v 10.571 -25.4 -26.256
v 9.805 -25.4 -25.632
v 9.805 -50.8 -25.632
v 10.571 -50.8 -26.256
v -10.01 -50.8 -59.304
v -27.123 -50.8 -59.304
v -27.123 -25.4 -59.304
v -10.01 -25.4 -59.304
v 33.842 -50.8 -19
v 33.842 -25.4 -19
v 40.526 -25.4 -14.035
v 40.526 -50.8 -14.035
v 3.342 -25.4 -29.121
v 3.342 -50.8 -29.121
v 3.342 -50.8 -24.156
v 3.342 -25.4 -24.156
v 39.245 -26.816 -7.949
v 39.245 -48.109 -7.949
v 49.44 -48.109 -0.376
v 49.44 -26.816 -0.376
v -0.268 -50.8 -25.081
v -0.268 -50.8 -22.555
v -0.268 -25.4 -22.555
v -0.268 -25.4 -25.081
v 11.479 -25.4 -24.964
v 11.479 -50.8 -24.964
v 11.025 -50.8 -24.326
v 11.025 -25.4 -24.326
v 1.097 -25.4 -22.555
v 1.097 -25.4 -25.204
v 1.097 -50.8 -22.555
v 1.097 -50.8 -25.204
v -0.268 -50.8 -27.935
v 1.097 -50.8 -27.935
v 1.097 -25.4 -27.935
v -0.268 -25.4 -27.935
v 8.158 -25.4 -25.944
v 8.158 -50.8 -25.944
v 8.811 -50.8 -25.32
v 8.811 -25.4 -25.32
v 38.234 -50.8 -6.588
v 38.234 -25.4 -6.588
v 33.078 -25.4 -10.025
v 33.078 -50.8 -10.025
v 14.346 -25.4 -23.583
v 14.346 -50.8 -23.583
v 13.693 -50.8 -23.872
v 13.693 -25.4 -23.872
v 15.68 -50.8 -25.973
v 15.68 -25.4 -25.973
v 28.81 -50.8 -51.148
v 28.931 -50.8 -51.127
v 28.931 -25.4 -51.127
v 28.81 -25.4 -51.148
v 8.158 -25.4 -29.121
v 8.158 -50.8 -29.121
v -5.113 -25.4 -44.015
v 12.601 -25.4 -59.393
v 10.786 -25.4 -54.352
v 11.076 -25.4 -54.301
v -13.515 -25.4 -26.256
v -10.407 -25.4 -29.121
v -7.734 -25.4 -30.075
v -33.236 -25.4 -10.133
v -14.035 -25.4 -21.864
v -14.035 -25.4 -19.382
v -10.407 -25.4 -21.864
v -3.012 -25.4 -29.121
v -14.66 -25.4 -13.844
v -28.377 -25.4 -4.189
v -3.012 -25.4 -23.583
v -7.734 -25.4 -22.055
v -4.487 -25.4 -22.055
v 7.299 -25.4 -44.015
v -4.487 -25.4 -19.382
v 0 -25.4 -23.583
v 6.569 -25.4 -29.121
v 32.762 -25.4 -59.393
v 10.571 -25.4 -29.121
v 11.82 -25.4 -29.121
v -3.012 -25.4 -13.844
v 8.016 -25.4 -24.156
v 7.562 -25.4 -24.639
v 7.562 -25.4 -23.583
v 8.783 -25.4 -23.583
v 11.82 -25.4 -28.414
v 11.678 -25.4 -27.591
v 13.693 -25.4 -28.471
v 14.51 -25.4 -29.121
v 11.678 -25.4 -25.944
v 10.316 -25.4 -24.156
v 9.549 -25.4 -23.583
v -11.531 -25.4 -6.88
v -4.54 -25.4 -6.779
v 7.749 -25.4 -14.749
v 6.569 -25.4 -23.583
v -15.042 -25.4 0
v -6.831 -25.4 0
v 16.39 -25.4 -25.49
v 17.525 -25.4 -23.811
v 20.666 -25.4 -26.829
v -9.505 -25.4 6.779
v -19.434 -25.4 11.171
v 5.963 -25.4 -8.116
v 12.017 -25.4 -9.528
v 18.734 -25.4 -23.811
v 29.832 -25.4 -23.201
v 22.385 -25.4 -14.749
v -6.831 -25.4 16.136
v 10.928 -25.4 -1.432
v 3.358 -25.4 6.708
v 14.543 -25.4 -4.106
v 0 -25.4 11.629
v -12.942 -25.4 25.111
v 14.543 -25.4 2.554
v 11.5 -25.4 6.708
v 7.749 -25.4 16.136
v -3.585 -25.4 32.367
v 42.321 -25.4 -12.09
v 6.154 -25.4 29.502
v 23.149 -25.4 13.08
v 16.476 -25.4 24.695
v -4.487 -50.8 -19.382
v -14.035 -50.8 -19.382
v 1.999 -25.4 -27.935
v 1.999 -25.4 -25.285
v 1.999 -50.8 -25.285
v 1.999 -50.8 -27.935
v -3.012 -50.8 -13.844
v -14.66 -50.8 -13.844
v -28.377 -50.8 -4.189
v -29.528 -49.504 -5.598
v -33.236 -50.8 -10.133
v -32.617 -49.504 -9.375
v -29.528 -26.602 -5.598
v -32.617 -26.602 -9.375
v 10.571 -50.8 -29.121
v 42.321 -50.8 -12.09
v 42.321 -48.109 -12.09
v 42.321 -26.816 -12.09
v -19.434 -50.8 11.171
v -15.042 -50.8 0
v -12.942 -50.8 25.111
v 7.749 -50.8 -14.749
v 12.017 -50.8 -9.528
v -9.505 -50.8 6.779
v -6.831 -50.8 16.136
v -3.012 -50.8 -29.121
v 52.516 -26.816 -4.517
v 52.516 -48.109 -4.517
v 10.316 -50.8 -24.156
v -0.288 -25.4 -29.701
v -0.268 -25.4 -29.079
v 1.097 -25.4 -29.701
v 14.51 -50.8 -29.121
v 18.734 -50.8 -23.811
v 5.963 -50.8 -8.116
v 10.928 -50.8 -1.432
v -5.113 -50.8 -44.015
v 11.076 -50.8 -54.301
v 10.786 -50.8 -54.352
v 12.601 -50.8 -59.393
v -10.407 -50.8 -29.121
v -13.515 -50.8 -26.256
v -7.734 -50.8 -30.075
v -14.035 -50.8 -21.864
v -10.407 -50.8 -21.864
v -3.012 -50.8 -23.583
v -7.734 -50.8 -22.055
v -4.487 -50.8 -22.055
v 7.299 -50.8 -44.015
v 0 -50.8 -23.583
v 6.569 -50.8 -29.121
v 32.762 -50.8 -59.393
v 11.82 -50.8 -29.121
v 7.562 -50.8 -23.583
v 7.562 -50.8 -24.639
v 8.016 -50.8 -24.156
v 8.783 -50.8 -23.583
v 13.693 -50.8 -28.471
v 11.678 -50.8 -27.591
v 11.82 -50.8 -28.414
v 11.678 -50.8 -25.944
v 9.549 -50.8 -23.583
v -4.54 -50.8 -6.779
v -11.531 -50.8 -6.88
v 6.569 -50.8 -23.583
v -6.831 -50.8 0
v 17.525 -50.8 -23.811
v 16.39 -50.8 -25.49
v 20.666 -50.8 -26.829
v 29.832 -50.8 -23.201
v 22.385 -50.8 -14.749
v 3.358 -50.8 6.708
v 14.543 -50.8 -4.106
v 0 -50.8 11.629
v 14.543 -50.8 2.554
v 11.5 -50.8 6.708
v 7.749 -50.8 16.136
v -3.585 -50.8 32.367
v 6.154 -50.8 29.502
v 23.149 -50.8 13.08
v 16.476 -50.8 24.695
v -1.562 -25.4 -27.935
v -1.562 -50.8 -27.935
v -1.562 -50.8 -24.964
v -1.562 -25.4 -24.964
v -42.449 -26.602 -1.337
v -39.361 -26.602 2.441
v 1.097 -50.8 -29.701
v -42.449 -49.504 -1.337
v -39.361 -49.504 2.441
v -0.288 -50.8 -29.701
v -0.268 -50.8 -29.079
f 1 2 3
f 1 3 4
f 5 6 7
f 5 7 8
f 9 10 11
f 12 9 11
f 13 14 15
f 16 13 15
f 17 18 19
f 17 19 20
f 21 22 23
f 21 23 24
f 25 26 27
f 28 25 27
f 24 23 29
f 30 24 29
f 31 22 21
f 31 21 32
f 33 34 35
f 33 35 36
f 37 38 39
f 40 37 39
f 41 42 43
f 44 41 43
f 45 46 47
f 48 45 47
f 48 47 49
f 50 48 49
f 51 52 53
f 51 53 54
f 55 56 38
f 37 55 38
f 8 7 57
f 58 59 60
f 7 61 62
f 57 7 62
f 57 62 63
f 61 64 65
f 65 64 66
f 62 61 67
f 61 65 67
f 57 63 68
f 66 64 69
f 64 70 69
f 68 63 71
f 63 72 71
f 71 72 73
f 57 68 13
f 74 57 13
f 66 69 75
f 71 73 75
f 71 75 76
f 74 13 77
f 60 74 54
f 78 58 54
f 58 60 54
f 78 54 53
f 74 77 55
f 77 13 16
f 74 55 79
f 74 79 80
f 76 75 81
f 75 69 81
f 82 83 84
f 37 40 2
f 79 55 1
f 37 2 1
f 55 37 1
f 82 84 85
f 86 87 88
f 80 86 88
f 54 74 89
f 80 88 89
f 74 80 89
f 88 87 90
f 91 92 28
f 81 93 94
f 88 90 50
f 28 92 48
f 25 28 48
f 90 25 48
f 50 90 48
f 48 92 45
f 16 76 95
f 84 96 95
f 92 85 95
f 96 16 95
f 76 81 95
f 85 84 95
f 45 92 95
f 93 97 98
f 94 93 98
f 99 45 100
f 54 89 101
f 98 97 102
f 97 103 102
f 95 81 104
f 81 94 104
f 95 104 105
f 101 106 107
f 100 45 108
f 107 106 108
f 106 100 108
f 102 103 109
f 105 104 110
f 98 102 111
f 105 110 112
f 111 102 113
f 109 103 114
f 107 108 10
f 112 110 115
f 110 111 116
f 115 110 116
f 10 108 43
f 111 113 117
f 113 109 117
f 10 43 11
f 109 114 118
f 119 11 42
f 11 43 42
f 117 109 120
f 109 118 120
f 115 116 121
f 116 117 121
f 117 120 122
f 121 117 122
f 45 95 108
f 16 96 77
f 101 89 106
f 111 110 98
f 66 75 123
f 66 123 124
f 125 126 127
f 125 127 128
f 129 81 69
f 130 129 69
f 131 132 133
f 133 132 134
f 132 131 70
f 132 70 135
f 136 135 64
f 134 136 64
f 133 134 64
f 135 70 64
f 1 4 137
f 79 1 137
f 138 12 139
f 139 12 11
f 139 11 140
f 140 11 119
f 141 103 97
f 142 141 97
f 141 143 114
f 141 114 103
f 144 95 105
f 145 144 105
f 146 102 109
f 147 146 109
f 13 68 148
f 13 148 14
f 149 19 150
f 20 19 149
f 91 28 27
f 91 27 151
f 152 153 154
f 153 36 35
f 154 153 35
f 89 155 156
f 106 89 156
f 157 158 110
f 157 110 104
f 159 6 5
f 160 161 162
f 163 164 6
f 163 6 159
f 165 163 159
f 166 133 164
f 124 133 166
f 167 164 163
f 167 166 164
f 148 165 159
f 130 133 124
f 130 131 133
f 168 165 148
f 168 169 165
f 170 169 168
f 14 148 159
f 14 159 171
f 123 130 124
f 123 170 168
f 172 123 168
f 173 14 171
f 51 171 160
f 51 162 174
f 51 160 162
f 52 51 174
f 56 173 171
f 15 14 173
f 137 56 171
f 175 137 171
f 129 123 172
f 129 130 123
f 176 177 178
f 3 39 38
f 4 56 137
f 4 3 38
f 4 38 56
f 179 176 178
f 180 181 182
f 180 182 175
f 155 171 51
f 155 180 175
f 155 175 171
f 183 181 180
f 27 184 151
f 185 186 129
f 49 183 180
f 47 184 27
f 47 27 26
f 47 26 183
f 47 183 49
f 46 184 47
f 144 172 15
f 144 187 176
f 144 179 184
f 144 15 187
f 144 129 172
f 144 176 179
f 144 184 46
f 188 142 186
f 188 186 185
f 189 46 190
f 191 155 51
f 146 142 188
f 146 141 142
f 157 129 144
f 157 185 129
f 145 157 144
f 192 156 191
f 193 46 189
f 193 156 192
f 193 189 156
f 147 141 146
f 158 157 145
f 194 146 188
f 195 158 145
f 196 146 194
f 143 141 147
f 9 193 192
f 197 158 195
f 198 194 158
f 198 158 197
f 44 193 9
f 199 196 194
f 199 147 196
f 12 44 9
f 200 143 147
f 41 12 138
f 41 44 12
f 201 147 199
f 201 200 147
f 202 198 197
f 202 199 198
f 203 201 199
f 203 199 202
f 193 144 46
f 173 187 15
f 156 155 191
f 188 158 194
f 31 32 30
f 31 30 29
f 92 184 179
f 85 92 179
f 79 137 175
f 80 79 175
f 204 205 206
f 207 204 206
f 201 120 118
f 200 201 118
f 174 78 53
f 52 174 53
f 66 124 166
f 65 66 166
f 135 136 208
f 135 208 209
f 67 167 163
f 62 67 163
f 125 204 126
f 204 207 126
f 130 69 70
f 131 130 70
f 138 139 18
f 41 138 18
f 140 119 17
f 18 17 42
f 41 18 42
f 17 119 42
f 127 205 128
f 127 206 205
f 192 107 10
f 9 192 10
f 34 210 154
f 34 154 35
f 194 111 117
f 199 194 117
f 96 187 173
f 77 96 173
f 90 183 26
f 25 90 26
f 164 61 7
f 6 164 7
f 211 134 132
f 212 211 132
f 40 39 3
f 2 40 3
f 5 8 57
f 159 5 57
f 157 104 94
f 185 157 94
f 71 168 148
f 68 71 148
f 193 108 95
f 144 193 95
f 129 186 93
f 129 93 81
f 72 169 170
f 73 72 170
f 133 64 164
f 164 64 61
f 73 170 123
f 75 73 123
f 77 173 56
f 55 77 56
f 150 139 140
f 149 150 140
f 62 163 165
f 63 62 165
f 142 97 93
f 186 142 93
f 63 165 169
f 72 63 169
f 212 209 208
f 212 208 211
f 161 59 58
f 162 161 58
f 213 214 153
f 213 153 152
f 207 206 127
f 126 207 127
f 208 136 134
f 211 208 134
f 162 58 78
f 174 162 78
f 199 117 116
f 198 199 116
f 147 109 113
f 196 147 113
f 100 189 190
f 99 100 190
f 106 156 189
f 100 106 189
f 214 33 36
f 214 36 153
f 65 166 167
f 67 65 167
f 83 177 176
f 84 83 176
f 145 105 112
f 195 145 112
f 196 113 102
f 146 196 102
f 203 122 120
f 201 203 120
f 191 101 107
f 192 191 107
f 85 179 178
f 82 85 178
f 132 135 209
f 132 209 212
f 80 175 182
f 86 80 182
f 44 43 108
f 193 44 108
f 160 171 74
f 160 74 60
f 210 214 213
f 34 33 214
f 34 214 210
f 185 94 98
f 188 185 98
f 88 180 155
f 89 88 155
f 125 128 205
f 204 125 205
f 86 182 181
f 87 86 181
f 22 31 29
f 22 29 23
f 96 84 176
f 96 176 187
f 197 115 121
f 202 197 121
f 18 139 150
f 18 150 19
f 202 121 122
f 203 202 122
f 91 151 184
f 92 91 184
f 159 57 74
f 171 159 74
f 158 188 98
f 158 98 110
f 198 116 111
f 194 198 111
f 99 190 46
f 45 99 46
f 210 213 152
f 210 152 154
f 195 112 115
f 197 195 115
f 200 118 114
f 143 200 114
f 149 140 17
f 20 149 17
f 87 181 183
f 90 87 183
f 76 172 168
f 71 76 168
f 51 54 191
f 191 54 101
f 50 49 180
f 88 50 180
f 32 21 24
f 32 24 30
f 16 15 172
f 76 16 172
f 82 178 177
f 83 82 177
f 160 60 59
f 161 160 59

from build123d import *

# Parameters (mm, degrees)
F0_W      = 127
F0_H      = 127
F1_DEPTH  = 25.4
F3_DEPTH  = 25.4
F4_W      = 127
F4_H      = 127
F5_DEPTH  = 25.4
F7_W      = 21.292546764
F7_H      = 5.1580702981
F8_DEPTH  = 12.7
F10_DEPTH = 50.8
F11_DEPTH = 25.4
F13_DEPTH = 25.4
F15_DEPTH = 25.4
F16_W     = 22.9024905711
F16_H     = 4.8794187605
F17_DEPTH = 12.7


with BuildPart() as f1:
    # F0 (on Front) → F1 (new body)
    with BuildSketch(Plane.XZ):
        with Locations((3.4296085835, -4.9572458267)):
            Rectangle(F0_W, F0_H)
    extrude(amount=F1_DEPTH)

    # F2 (on face) → F3 (join)
    with BuildSketch(Plane.XZ.offset(25.4)):
        Polygon((-11.5312809151, -6.8796158486), (-3.0120853335, -13.8442134485), (0, -18.8090335578), (4.6261004172, -18.8090335578), (7.7486997525, -14.7494874672), (12.0172404771, -9.5281472878), (14.5428453358, -4.1055250913), (14.5428453358, 2.5535861486), (23.1487024575, 13.0803938955), (16.4757714356, 24.6949718974), (6.1537381262, 29.5024942607), (-3.5849492997, 32.3668159544), (-12.9417274147, 25.1105371863), (-19.4341856986, 11.1708473414), (-15.0422295555, 0), align=None)
        Polygon((-4.5397225767, -6.778890267), (-6.8311784416, 0), (10.9276045114, -1.4321599156), (5.9627834707, -8.1155728549), align=None, mode=Mode.SUBTRACT)
        Polygon((-9.5045436174, 6.778890267), (-6.8311784416, 16.135668382), (0, 11.629446639), align=None, mode=Mode.SUBTRACT)
        Polygon((3.357668215, 6.7078653751), (7.7486997525, 16.135668382), (11.5004684776, 6.7078653751), align=None, mode=Mode.SUBTRACT)
        Polygon((-13.5145923123, -26.2562651187), (-19.2093339527, -40.0863518289), (25.1056363762, -40.0863518289), (20.6662919372, -26.8291290849), (29.8321153969, -23.2009887695), (33.8421612978, -18.9999882132), (40.5255742371, -14.0351671726), (42.3212711359, -12.0898670095), (38.2341220975, -6.5879356116), (33.0783426762, -10.0251203403), (22.3848838359, -14.7494874672), (7.7486997525, -14.7494874672), (4.6261004172, -18.8090335578), (0, -18.8090335578), (-3.0120853335, -13.8442134485), (-14.6603202447, -13.8442134485), (-28.3771033253, -4.1891960393), (-33.2364836264, -10.1332596549), align=None)
        Polygon((-3.3939946443, -25.8743558079), (1.9527353579, -25.8743558079), (1.7617807025, -32.74872154), (-3.3939946443, -32.74872154), align=None, mode=Mode.SUBTRACT)
        Polygon((1.7617807025, -32.74872154), (1.9527353579, -25.8743558079), (-3.3939946443, -25.8743558079), (-3.3939946443, -32.74872154), align=None)
        Polygon((-19.2093339527, -40.0863518289), (-27.1226547061, -59.304416334), (-10.0099617179, -59.304416334), (-5.112586543, -44.0150499344), (7.2994660586, -44.0150499344), (11.1350120984, -54.4607923407), (28.872437502, -51.3351571972), (25.1056363762, -40.0863518289), align=None)
    extrude(amount=F3_DEPTH)

    # F4 (on face) → F5 (cut)
    with BuildSketch(Plane.XZ.offset(25.4)):
        with Locations((3.4296085835, -4.9572458267)):
            Rectangle(F4_W, F4_H)
    extrude(amount=-F5_DEPTH, mode=Mode.SUBTRACT)

    # F7 (on face) → F8 (join)
    with BuildSketch(Plane(origin=(21.4843651567, 0, 15.9598141164), x_dir=(0, 1, 0), z_dir=(0.802743848, 0, 0.5963240013))):
        with Locations((-37.4624868855, -32.3632209609)):
            Rectangle(F7_W, F7_H)
    extrude(amount=F8_DEPTH)

    # F9 (on Front) → F10 (join)
    with BuildSketch(Plane.XZ):
        Polygon((28.9311148226, -51.1266589165), (10.786164552, -54.3524250388), (12.6006603241, -59.3926906586), (32.7617116272, -59.3926906586), align=None)
    extrude(amount=F10_DEPTH)

    # F11 (cut): a face of the model
    f11_faces = [f1.faces().sort_by_distance(p)[0] for p in [
        (22.0640807885, 0, -56.0179852405),
    ]]
    extrude(f11_faces, amount=-F11_DEPTH, mode=Mode.SUBTRACT)

    # F12 (on face) → F13 (cut)
    with BuildSketch(Plane.XZ.offset(50.8)):
        Polygon((-10.4070287198, -21.8643080443), (-10.4070287198, -29.1205849499), (-7.7336635441, -30.0753582269), (-7.7336635441, -22.0552626997), (-4.4874348678, -22.0552626997), (-4.4874348678, -19.381897524), (-14.0351671726, -19.381897524), (-14.0351671726, -21.8643080443), align=None)
        Polygon((3.3417069353, -24.1557639092), (0, -23.582899943), (-3.0120853335, -23.582899943), (-3.0120853335, -29.1205849499), (3.3417069353, -29.1205849499), align=None)
        Polygon((-1.5619223705, -27.9349666089), (-1.5619223705, -24.964408949), (1.9993705209, -25.2850931138), (1.9993705209, -27.9349666089), align=None, mode=Mode.SUBTRACT)
        Polygon((6.5686665475, -23.582899943), (6.5686665475, -29.1205849499), (8.1582581624, -29.1205849499), (8.1582581624, -25.9443577379), (8.8111273944, -25.3198742867), (9.8046222702, -25.632115081), (10.5710327625, -26.2562651187), (10.5710327625, -29.1205849499), (11.8199978024, -29.1205849499), (11.8199978024, -28.4139029682), (11.6780707613, -27.590719983), (11.6780707613, -25.9443577379), (11.4793712273, -24.964408949), (11.0252024606, -24.3263784796), (10.3155635297, -24.1557639092), (9.549152106, -23.582899943), (8.7827416137, -23.582899943), (8.0163311213, -24.1557639092), (7.5621614233, -24.6386211365), (7.5621614233, -23.582899943), align=None)
        Polygon((14.3463145941, -23.582899943), (13.6934462935, -23.8722097129), (15.6804360449, -25.9727425873), (13.6934462935, -28.4706745297), (14.51047718, -29.1205849499), (18.7336941345, -23.8113937363), (17.5254996866, -23.8113937363), (16.3900759071, -25.4901871085), align=None)
    extrude(amount=-F13_DEPTH, mode=Mode.SUBTRACT)

    # F16 (on face) → F17 (join)
    with BuildSketch(Plane(origin=(-14.9564348332, 0, 12.2271579685), x_dir=(0, -1, 0), z_dir=(-0.7742090335, 0, 0.6329299902))):
        with Locations((38.0530310795, -25.4627745599)):
            Rectangle(F16_W, F16_H)
    extrude(amount=F17_DEPTH)


with BuildPart() as f15:
    # F14 (on face) → F15 (new body)
    with BuildSketch(Plane.XZ.offset(50.8)):
        Polygon((-0.2678239543, -22.5552357733), (-0.2678239543, -25.0809387831), (1.0970472358, -25.2038415016), (1.0970472358, -22.5552357733), align=None)
    extrude(amount=-F15_DEPTH)


with BuildPart() as f15b:
    # F14 (on face) → F15, piece 2 (new body)
    with BuildSketch(Plane.XZ.offset(50.8)):
        Polygon((-0.2678239543, -27.9349666089), (-0.2678239543, -29.0785171092), (-0.2878957312, -29.7007374465), (1.0970472358, -29.7007374465), (1.0970472358, -27.9349666089), align=None)
    extrude(amount=-F15_DEPTH)


solid = Compound([f1.part, f15.part, f15b.part])
